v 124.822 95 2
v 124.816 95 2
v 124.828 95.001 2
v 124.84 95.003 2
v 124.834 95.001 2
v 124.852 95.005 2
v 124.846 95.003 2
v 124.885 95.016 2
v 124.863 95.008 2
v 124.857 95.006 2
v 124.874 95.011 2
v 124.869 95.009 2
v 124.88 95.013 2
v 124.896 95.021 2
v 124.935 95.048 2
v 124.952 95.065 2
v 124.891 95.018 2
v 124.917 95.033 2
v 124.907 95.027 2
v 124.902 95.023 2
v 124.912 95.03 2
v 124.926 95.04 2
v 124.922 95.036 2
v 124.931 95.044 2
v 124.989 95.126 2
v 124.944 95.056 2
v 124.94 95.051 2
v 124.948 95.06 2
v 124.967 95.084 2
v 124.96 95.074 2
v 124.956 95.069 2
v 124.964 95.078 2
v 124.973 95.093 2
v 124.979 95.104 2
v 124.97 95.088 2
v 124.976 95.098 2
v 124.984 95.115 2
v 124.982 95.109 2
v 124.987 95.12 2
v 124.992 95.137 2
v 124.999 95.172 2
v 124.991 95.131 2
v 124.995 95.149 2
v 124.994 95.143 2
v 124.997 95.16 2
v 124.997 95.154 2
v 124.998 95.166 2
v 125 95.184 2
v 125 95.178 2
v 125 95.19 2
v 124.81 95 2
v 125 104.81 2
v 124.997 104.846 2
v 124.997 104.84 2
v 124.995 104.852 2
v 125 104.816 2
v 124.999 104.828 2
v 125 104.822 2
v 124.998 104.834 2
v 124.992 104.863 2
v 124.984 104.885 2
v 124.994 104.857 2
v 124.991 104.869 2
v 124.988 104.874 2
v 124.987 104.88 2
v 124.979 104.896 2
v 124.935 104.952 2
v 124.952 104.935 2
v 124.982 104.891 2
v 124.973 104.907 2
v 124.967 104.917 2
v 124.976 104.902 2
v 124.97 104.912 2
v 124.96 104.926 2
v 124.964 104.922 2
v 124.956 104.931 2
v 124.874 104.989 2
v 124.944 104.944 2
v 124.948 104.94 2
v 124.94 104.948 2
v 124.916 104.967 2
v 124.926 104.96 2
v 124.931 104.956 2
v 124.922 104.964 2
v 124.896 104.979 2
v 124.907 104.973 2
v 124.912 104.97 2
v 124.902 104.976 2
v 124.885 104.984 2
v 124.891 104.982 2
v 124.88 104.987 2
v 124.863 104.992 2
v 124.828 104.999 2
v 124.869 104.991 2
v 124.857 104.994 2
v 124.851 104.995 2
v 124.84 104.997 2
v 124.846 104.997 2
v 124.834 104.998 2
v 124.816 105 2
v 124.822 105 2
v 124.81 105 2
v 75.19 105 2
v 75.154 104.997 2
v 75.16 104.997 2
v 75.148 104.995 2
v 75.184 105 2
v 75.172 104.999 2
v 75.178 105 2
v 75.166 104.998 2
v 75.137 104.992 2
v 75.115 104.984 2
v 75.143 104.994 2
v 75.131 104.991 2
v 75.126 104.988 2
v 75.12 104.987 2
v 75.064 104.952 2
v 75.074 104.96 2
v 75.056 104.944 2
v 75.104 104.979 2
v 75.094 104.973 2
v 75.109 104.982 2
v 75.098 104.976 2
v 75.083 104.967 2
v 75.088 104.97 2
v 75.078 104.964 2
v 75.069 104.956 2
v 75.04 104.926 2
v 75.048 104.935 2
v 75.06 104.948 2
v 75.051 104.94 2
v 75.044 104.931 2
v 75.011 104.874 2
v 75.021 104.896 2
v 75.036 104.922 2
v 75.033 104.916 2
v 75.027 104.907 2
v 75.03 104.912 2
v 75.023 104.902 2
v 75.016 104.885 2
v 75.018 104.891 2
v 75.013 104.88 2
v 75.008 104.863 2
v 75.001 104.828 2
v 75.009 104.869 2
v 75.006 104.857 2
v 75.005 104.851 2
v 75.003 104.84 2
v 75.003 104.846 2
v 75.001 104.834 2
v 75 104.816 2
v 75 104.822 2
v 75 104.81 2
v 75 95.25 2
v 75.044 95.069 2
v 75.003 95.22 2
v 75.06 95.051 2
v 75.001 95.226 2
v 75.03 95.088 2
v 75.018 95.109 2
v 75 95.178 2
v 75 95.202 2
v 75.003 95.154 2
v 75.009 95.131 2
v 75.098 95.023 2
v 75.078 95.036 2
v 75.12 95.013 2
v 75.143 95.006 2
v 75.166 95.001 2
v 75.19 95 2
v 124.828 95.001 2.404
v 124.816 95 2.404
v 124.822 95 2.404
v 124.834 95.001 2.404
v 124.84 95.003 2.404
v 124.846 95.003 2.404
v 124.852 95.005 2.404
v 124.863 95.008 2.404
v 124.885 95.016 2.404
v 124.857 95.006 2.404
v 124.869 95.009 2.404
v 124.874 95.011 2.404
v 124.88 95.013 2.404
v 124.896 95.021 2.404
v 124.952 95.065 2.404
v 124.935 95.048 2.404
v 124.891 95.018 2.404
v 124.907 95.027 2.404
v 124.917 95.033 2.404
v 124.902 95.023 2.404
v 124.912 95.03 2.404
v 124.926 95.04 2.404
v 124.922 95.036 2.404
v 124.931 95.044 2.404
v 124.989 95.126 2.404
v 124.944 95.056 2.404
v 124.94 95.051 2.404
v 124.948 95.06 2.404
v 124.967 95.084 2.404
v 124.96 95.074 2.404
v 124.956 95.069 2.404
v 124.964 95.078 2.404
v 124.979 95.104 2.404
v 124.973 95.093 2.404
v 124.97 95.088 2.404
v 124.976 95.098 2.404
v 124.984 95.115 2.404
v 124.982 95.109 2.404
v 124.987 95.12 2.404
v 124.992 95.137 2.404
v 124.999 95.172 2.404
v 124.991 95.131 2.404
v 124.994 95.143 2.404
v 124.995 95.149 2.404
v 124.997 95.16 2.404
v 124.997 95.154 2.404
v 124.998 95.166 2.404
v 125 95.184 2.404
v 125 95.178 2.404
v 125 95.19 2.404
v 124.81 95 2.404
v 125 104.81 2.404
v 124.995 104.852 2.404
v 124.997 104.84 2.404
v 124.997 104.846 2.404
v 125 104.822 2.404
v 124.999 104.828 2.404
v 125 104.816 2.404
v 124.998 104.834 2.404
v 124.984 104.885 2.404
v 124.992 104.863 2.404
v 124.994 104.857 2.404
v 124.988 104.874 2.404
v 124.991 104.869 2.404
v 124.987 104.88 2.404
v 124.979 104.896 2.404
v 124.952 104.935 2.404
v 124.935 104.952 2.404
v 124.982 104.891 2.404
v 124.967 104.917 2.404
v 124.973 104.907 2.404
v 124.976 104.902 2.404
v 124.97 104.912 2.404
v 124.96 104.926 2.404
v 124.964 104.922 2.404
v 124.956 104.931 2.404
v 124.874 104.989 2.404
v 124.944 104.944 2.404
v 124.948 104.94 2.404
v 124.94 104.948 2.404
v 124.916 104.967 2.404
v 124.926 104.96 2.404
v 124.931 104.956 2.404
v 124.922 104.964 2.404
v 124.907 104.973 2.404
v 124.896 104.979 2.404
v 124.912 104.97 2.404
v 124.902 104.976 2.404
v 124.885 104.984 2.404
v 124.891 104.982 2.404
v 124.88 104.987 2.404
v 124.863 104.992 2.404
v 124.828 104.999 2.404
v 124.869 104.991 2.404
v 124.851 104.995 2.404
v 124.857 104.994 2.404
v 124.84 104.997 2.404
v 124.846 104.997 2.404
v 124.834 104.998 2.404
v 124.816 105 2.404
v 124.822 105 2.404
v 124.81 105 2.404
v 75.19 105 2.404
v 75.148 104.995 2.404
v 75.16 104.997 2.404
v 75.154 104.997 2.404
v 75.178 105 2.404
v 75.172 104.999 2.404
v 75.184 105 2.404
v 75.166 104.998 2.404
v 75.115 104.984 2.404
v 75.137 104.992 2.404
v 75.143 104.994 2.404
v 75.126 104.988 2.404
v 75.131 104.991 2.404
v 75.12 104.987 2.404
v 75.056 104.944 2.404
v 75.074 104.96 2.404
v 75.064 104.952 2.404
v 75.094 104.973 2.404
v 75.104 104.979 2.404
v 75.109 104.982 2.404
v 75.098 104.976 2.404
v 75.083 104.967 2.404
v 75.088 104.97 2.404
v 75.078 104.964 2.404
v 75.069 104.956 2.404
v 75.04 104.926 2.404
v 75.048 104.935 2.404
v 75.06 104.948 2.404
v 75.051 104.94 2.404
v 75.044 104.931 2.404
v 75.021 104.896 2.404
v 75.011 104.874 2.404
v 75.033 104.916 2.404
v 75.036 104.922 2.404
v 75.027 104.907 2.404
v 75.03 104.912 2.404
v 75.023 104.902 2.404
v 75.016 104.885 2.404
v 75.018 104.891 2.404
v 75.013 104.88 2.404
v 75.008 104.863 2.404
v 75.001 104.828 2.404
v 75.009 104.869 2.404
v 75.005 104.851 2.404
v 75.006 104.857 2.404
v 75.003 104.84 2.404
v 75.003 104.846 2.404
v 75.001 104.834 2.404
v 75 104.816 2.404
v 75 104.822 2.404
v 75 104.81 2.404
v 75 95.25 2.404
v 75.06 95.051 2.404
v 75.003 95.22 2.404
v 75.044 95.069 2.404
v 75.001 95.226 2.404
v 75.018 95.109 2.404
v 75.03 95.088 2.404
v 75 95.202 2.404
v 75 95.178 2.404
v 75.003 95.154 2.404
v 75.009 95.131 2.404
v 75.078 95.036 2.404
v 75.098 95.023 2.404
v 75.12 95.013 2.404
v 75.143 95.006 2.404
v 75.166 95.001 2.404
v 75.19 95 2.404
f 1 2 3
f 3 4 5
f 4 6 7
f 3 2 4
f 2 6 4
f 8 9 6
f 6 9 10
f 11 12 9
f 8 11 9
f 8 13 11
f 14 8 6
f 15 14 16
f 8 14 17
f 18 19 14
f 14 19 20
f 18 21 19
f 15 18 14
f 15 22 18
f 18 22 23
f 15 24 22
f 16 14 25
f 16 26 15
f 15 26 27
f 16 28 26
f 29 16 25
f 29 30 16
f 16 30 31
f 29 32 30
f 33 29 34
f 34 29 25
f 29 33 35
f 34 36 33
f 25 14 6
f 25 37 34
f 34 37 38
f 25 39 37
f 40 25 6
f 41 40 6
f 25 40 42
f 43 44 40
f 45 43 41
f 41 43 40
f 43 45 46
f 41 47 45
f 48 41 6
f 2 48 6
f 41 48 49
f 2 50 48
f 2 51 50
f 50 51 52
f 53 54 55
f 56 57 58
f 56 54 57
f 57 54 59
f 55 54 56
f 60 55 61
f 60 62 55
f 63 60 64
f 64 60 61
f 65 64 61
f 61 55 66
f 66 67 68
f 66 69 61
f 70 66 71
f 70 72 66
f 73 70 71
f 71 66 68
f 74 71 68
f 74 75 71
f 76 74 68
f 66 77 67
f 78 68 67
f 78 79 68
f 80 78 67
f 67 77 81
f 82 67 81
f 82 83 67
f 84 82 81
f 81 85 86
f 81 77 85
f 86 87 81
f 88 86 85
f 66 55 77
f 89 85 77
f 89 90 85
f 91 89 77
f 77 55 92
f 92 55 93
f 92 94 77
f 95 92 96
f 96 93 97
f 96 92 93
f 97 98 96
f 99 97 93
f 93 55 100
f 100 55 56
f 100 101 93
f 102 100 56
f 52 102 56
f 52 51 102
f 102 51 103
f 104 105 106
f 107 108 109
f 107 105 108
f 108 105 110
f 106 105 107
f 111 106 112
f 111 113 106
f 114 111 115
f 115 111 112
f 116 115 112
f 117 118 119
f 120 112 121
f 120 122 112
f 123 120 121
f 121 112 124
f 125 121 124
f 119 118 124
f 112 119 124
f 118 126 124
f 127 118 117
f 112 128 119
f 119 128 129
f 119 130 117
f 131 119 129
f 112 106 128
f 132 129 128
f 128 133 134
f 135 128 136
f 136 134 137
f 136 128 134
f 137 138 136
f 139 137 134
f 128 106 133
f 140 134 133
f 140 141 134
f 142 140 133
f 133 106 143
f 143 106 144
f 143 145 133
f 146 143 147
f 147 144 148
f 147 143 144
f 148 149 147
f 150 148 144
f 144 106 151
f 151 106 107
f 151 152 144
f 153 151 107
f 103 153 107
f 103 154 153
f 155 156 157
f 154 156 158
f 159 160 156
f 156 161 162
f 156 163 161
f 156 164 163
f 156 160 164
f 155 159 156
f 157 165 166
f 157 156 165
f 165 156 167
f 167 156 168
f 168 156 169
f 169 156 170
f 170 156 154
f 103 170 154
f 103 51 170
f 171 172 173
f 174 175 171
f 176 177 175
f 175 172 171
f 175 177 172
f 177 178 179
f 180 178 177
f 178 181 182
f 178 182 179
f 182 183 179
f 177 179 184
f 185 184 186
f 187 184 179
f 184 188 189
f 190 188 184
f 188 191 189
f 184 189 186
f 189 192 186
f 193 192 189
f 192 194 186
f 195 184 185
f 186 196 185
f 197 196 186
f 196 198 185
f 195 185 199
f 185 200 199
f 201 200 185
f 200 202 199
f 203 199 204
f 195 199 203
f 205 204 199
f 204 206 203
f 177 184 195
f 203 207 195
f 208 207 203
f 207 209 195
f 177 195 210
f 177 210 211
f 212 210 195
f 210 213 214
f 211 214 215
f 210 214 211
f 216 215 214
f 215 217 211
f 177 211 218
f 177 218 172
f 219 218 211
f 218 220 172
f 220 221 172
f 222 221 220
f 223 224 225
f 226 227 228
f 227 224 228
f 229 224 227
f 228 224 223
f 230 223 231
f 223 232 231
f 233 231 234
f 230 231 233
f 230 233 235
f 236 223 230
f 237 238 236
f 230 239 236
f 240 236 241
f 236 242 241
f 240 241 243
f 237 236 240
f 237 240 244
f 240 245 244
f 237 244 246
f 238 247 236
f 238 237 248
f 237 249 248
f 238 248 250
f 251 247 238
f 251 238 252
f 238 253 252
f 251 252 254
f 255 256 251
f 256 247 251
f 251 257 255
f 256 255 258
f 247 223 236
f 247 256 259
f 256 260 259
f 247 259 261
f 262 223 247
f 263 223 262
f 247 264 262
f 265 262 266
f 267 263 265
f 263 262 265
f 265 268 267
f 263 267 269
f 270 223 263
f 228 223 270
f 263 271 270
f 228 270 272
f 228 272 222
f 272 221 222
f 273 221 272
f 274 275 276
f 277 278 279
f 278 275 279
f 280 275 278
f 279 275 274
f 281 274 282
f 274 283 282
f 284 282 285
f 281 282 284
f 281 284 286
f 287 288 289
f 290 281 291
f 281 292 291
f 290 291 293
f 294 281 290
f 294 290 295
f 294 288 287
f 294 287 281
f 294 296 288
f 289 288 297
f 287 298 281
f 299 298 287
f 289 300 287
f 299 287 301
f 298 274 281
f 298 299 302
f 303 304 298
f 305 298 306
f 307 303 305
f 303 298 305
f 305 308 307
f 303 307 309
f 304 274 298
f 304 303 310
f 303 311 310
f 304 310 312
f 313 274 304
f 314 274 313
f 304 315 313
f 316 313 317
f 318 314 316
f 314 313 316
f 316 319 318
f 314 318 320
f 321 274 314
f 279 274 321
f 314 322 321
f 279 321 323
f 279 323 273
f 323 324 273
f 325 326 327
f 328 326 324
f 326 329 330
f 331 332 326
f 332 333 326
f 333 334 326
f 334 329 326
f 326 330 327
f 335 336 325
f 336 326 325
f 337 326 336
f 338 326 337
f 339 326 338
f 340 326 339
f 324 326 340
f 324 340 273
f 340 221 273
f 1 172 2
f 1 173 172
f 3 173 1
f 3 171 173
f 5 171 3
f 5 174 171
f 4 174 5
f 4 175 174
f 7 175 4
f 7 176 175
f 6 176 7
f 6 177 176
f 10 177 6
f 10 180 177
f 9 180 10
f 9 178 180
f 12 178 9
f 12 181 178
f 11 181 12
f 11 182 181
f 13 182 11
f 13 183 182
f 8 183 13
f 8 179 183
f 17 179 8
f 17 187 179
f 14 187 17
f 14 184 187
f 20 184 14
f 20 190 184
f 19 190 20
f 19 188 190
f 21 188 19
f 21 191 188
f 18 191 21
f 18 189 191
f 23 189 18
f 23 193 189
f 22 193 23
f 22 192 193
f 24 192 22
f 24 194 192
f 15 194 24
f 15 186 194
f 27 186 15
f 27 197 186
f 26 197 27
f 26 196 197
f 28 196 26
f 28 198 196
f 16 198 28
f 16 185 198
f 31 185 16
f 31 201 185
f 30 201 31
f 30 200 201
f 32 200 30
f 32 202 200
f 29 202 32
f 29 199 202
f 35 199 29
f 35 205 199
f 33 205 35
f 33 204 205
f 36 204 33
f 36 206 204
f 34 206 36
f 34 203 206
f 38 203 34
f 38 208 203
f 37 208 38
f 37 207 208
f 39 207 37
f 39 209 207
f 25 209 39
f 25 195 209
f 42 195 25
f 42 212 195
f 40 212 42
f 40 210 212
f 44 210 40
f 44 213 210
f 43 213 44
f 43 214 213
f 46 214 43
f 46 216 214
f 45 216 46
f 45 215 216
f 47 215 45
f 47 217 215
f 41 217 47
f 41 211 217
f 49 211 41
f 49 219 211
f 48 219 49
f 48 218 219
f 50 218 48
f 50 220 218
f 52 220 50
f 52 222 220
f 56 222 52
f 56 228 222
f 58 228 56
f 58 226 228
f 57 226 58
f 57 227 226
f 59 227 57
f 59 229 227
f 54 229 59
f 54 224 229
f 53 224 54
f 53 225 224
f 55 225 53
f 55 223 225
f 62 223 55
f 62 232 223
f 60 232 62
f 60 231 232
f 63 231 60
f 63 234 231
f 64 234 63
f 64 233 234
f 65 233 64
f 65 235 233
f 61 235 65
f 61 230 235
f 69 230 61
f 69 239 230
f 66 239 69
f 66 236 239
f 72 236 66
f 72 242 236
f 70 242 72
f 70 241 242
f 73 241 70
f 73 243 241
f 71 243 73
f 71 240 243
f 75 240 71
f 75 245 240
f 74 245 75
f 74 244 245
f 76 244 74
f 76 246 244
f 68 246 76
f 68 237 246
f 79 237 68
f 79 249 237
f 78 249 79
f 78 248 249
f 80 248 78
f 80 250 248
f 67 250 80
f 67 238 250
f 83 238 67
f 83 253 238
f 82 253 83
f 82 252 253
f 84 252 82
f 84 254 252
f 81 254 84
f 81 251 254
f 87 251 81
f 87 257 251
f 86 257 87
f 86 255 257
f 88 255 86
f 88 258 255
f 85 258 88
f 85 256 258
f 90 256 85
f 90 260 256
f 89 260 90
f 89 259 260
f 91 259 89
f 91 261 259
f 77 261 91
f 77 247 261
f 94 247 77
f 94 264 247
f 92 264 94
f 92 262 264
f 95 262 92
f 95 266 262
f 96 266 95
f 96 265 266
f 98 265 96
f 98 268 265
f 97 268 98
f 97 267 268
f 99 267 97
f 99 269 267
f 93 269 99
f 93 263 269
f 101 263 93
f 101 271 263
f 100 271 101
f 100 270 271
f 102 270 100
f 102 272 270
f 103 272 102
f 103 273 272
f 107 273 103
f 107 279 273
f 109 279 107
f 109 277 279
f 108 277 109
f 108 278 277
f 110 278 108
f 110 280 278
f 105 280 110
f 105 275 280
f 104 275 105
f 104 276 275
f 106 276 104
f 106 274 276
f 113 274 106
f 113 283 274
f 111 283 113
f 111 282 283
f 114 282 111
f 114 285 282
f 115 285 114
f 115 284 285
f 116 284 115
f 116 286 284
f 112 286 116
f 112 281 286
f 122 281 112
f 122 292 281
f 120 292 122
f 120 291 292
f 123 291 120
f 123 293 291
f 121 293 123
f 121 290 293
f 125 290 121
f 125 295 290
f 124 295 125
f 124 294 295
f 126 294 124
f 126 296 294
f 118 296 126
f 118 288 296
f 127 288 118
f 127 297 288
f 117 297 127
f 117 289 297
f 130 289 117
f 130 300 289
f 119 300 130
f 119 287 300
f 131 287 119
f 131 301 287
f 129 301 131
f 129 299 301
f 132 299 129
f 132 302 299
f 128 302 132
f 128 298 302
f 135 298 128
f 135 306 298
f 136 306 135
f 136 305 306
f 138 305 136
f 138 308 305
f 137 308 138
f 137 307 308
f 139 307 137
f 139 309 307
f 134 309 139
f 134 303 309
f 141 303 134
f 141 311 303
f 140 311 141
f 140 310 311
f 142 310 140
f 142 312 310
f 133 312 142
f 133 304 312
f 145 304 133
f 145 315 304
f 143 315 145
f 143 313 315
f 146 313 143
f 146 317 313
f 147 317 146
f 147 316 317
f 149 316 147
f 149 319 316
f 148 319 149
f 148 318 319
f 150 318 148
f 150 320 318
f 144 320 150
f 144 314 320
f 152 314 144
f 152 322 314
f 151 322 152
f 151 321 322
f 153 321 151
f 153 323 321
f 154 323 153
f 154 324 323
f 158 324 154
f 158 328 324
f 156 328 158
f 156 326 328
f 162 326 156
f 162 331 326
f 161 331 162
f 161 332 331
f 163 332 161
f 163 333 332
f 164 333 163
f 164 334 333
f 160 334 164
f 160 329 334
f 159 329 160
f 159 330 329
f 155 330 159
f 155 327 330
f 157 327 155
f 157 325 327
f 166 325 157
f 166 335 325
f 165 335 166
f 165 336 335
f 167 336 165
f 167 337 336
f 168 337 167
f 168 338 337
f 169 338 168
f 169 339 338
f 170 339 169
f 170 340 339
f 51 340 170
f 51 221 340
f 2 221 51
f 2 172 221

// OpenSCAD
module drawBasicShape(x1, y1, x2, y2, width)
{
	length = sqrt((x1-x2)*(x1-x2) + (y1-y2)*(y1-y2));
	if (width!=0.0) {
		square(size = [width, length], center = false);
		translate([width/2.0, 0, 0]) circle(d=width);
		translate([width/2.0, length, 0]) circle(d=width);
	}
}

module translateAndRotate(x1, y1, x2, y2, width)
{
	if (width != 0.0) {
		angle = atan((y2-y1)/(x2-x1)) +270;
		if (x2>=x1) {
			translate([x1, y1, 0.0]) rotate([0.0, 0.0, angle]) translate([-width/2.0, 0.0, 0.0]) scale([1.0, 1.0, 1.0]) drawBasicShape(x1, y1, x2, y2, width);
		}
		else {
			translate([x1, y1, 0.0]) rotate([0.0, 0.0, angle+180]) translate([-width/2.0, 0.0, 0.0]) scale([1.0, 1.0, 1.0]) drawBasicShape(x1, y1, x2, y2, width);		}
	}
}

$fn=50;

points4 = [
[75.77800000, 95.77800000, 0.00000000],
[124.22200000, 95.77800000, 0.37999672],
[124.22200000, 104.22200000, 0.37997788],
[75.77800000, 104.22200000, 0.37999548],
[75.77800000, 95.83800000, 0.37998140],
[75.48400000, 95.48400000, 0.00000000],
[124.51600000, 95.48400000, 0.37999746],
[124.51600000, 104.51600000, 0.37998977],
[75.48400000, 104.51600000, 0.37999868],
[75.48400000, 95.54400000, 0.37998644],
[75.19000000, 95.19000000, 0.00000000],
[124.81000000, 95.19000000, 0.38000060],
[124.81000000, 104.81000000, 0.38000021],
[75.19000000, 104.81000000, 0.37999939],
[75.19000000, 95.25000000, 0.38000344],
[75.53600000, 95.39000000, 0.00000000],
[75.94600000, 103.88900000, 0.00000000],
[76.11100000, 104.05400000, 0.37961375],
[76.52800000, 104.05400000, 0.38001190],
[75.94600000, 103.47200000, 0.37989934],
[75.94600000, 103.05500000, 0.38001190],
[76.94500000, 104.05400000, 0.37998907],
[77.36200000, 104.05400000, 0.38001190],
[75.94600000, 102.63800000, 0.37999592],
[75.94600000, 102.22100000, 0.38001190],
[77.77900000, 104.05400000, 0.37999966],
[78.19600000, 104.05400000, 0.38001190],
[75.94600000, 101.80400000, 0.38000201],
[75.94600000, 101.38700000, 0.38015610],
[78.61300000, 104.05400000, 0.38000362],
[79.03000000, 104.05400000, 0.38015610],
[75.94600000, 100.97000000, 0.38001859],
[75.94600000, 100.55300000, 0.38001190],
[79.44700000, 104.05400000, 0.38001785],
[79.86400000, 104.05400000, 0.38015610],
[75.94600000, 100.13600000, 0.38001726],
[75.94600000, 99.71900000, 0.38015610],
[80.28100000, 104.05400000, 0.38002660],
[80.69800000, 104.05400000, 0.38001190],
[75.94600000, 99.30200000, 0.38002534],
[75.94600000, 98.88500000, 0.38001190],
[81.11500000, 104.05400000, 0.38003252],
[81.53300000, 104.05400000, 0.37930814],
[75.94600000, 98.46700000, 0.37997836],
[75.94600000, 98.05000000, 0.38015610],
[81.95000000, 104.05400000, 0.37998072],
[82.36700000, 104.05400000, 0.38001190],
[75.94600000, 97.63300000, 0.37998939],
[75.94600000, 97.21600000, 0.38001190],
[82.78400000, 104.05400000, 0.37999079],
[83.20100000, 104.05400000, 0.38001190],
[75.94600000, 96.79900000, 0.37999789],
[75.94600000, 96.38200000, 0.38001190],
[83.61800000, 104.05400000, 0.37999868],
[84.03500000, 104.05400000, 0.38001190],
[75.95600000, 95.97600000, 0.38000275],
[76.34400000, 95.94600000, 0.37958004],
[84.45200000, 104.05400000, 0.38000229],
[84.86900000, 104.05400000, 0.38001190],
[76.76100000, 95.94600000, 0.38000754],
[77.17800000, 95.94600000, 0.38001190],
[85.28600000, 104.05400000, 0.38000229],
[85.70300000, 104.05400000, 0.38015610],
[77.59500000, 95.94600000, 0.38000229],
[78.01200000, 95.94600000, 0.38001190],
[86.12000000, 104.05400000, 0.38000754],
[86.53700000, 104.05400000, 0.38001190],
[78.42900000, 95.94600000, 0.38000229],
[78.84600000, 95.94600000, 0.38001190],
[86.95400000, 104.05400000, 0.38000754],
[87.37100000, 104.05400000, 0.38001190],
[79.26300000, 95.94600000, 0.38000229],
[79.68000000, 95.94600000, 0.38015610],
[87.78900000, 104.05400000, 0.37998415],
[88.20600000, 104.05400000, 0.38001190],
[80.09700000, 95.94600000, 0.37998940],
[80.51500000, 95.94600000, 0.37930814],
[88.62300000, 104.05400000, 0.38000229],
[89.04000000, 104.05400000, 0.38001190],
[80.93200000, 95.94600000, 0.38000754],
[81.34900000, 95.94600000, 0.38001190],
[89.45700000, 104.05400000, 0.38000229],
[89.87400000, 104.05400000, 0.38015610],
[81.76600000, 95.94600000, 0.38000229],
[82.18300000, 95.94600000, 0.38001190],
[90.29100000, 104.05400000, 0.38000229],
[90.70800000, 104.05400000, 0.38015610],
[82.60000000, 95.94600000, 0.38000229],
[83.01700000, 95.94600000, 0.38001190],
[91.12500000, 104.05400000, 0.38000754],
[91.54200000, 104.05400000, 0.38001190],
[83.43400000, 95.94600000, 0.38000229],
[83.85100000, 95.94600000, 0.38015610],
[91.95900000, 104.05400000, 0.38000229],
[92.37600000, 104.05400000, 0.38001190],
[84.26800000, 95.94600000, 0.38000229],
[84.68500000, 95.94600000, 0.38015610],
[92.79300000, 104.05400000, 0.38000229],
[93.21000000, 104.05400000, 0.38001190],
[85.10200000, 95.94600000, 0.38000754],
[85.51900000, 95.94600000, 0.38001190],
[93.62700000, 104.05400000, 0.38000229],
[94.04400000, 104.05400000, 0.38001190],
[85.93600000, 95.94600000, 0.38000754],
[86.35300000, 95.94600000, 0.38001190],
[94.46200000, 104.05400000, 0.37998415],
[94.87900000, 104.05400000, 0.38015610],
[86.77000000, 95.94600000, 0.37998415],
[87.18800000, 95.94600000, 0.37930814],
[95.29600000, 104.05400000, 0.38000754],
[95.71300000, 104.05400000, 0.38001190],
[87.60500000, 95.94600000, 0.38000229],
[88.02200000, 95.94600000, 0.38001190],
[96.13000000, 104.05400000, 0.38000754],
[96.54700000, 104.05400000, 0.38001190],
[88.43900000, 95.94600000, 0.38000229],
[88.85600000, 95.94600000, 0.38015610],
[96.96400000, 104.05400000, 0.38000229],
[97.38100000, 104.05400000, 0.38001190],
[89.27300000, 95.94600000, 0.38000754],
[89.69000000, 95.94600000, 0.38001190],
[97.79800000, 104.05400000, 0.38000229],
[98.21500000, 104.05400000, 0.38001190],
[90.10700000, 95.94600000, 0.38000754],
[90.52400000, 95.94600000, 0.38001190],
[98.63200000, 104.05400000, 0.38000229],
[99.04900000, 104.05400000, 0.38015610],
[90.94100000, 95.94600000, 0.38000229],
[91.35800000, 95.94600000, 0.38001190],
[99.46600000, 104.05400000, 0.38000754],
[99.88300000, 104.05400000, 0.38001190],
[91.77500000, 95.94600000, 0.38000229],
[92.19200000, 95.94600000, 0.38001190],
[100.30000000, 104.05400000, 0.38000754],
[100.71800000, 104.05400000, 0.37930814],
[92.60900000, 95.94600000, 0.37998415],
[93.02600000, 95.94600000, 0.38015610],
[101.13500000, 104.05400000, 0.37998415],
[101.55200000, 104.05400000, 0.38001190],
[93.44400000, 95.94600000, 0.38000754],
[93.86100000, 95.94600000, 0.38001190],
[101.96900000, 104.05400000, 0.38000229],
[102.38600000, 104.05400000, 0.38001190],
[94.27800000, 95.94600000, 0.38000754],
[94.69500000, 95.94600000, 0.38001190],
[102.80300000, 104.05400000, 0.38000229],
[103.22000000, 104.05400000, 0.38015610],
[95.11200000, 95.94600000, 0.38000229],
[95.52900000, 95.94600000, 0.38001190],
[103.63700000, 104.05400000, 0.38000754],
[104.05400000, 104.05400000, 0.38001190],
[95.94600000, 95.94600000, 0.38000229],
[96.36300000, 95.94600000, 0.38001190],
[104.47100000, 104.05400000, 0.38000754],
[104.88800000, 104.05400000, 0.38001190],
[96.78000000, 95.94600000, 0.38000229],
[97.19700000, 95.94600000, 0.38015610],
[105.30500000, 104.05400000, 0.38000229],
[105.72200000, 104.05400000, 0.38001190],
[97.61400000, 95.94600000, 0.38000229],
[98.03100000, 95.94600000, 0.38015610],
[106.13900000, 104.05400000, 0.38000229],
[106.55600000, 104.05400000, 0.38001190],
[98.44800000, 95.94600000, 0.38000754],
[98.86500000, 95.94600000, 0.38001190],
[106.97300000, 104.05400000, 0.38000229],
[107.39100000, 104.05400000, 0.37945200],
[99.28200000, 95.94600000, 0.37998415],
[99.69900000, 95.94600000, 0.38001190],
[107.80800000, 104.05400000, 0.37998415],
[108.22500000, 104.05400000, 0.38015610],
[100.11700000, 95.94600000, 0.38000229],
[100.53400000, 95.94600000, 0.38001190],
[108.64200000, 104.05400000, 0.38000754],
[109.05900000, 104.05400000, 0.38001190],
[100.95100000, 95.94600000, 0.38000229],
[101.36800000, 95.94600000, 0.38001190],
[109.47600000, 104.05400000, 0.38000754],
[109.89300000, 104.05400000, 0.38001190],
[101.78500000, 95.94600000, 0.38000229],
[102.20200000, 95.94600000, 0.38015610],
[110.31000000, 104.05400000, 0.38000229],
[110.72700000, 104.05400000, 0.38001190],
[102.61900000, 95.94600000, 0.38000754],
[103.03600000, 95.94600000, 0.38001190],
[111.14400000, 104.05400000, 0.38000229],
[111.56100000, 104.05400000, 0.38001190],
[103.45300000, 95.94600000, 0.38000754],
[103.87000000, 95.94600000, 0.38001190],
[111.97800000, 104.05400000, 0.38000229],
[112.39500000, 104.05400000, 0.38015610],
[104.28700000, 95.94600000, 0.38000229],
[104.70400000, 95.94600000, 0.38001190],
[112.81200000, 104.05400000, 0.38000754],
[113.22900000, 104.05400000, 0.38001190],
[105.12100000, 95.94600000, 0.38000229],
[105.53800000, 95.94600000, 0.38001190],
[113.64700000, 104.05400000, 0.37998940],
[114.06400000, 104.05400000, 0.38001190],
[105.95500000, 95.94600000, 0.37998415],
[106.37300000, 95.94600000, 0.37945200],
[114.48100000, 104.05400000, 0.38000229],
[114.89800000, 104.05400000, 0.38001190],
[106.79000000, 95.94600000, 0.38000754],
[107.20700000, 95.94600000, 0.38001190],
[115.31500000, 104.05400000, 0.38000229],
[115.73200000, 104.05400000, 0.38001190],
[107.62400000, 95.94600000, 0.38000754],
[108.04100000, 95.94600000, 0.38001190],
[116.14900000, 104.05400000, 0.38000229],
[116.56600000, 104.05400000, 0.38015610],
[108.45800000, 95.94600000, 0.38000229],
[108.87500000, 95.94600000, 0.38001190],
[116.98300000, 104.05400000, 0.38000754],
[117.40000000, 104.05400000, 0.38001190],
[109.29200000, 95.94600000, 0.38000229],
[109.70900000, 95.94600000, 0.38001190],
[117.81700000, 104.05400000, 0.38000754],
[118.23400000, 104.05400000, 0.38001190],
[110.12600000, 95.94600000, 0.38000229],
[110.54300000, 95.94600000, 0.38015610],
[118.65100000, 104.05400000, 0.38000229],
[119.06800000, 104.05400000, 0.38001190],
[110.96000000, 95.94600000, 0.38000229],
[111.37700000, 95.94600000, 0.38015610],
[119.48500000, 104.05400000, 0.38000229],
[119.90200000, 104.05400000, 0.38001190],
[111.79400000, 95.94600000, 0.38000754],
[112.21100000, 95.94600000, 0.38001190],
[120.32000000, 104.05400000, 0.37998415],
[120.73700000, 104.05400000, 0.38001190],
[112.62900000, 95.94600000, 0.38000754],
[113.04600000, 95.94600000, 0.38001190],
[121.15400000, 104.05400000, 0.38000229],
[121.57100000, 104.05400000, 0.38015610],
[113.46300000, 95.94600000, 0.38000229],
[113.88000000, 95.94600000, 0.38001190],
[121.98800000, 104.05400000, 0.38000754],
[122.40500000, 104.05400000, 0.38001190],
[114.29700000, 95.94600000, 0.38000229],
[114.71400000, 95.94600000, 0.38001190],
[122.82200000, 104.05400000, 0.38000754],
[123.23900000, 104.05400000, 0.38001190],
[115.13100000, 95.94600000, 0.38000229],
[115.54800000, 95.94600000, 0.38015610],
[123.65600000, 104.05400000, 0.38000229],
[124.04400000, 104.02500000, 0.37963728],
[115.96500000, 95.94600000, 0.37998455],
[116.38200000, 95.94600000, 0.38001190],
[124.05400000, 103.61800000, 0.37999868],
[124.05400000, 103.20100000, 0.38015610],
[116.79900000, 95.94600000, 0.37999203],
[117.21600000, 95.94600000, 0.38015610],
[124.05400000, 102.78400000, 0.37999079],
[124.05400000, 102.36700000, 0.38001190],
[117.63300000, 95.94600000, 0.37998939],
[118.05000000, 95.94600000, 0.38001190],
[124.05400000, 101.95000000, 0.37998780],
[124.05400000, 101.53300000, 0.38001190],
[118.46700000, 95.94600000, 0.37998597],
[118.88400000, 95.94600000, 0.38001190],
[124.05400000, 101.11600000, 0.37997562],
[124.05400000, 100.69800000, 0.37930814],
[119.30200000, 95.94600000, 0.38003429],
[119.71900000, 95.94600000, 0.38001190],
[124.05400000, 100.28100000, 0.38003640],
[124.05400000, 99.86400000, 0.38001190],
[120.13600000, 95.94600000, 0.38002811],
[120.55300000, 95.94600000, 0.38001190],
[124.05400000, 99.44700000, 0.38002999],
[124.05400000, 99.03000000, 0.38001190],
[120.97000000, 95.94600000, 0.38003238],
[121.38700000, 95.94600000, 0.38001190],
[124.05400000, 98.61300000, 0.38001957],
[124.05400000, 98.19600000, 0.38001190],
[121.80400000, 95.94600000, 0.38002091],
[122.22100000, 95.94600000, 0.38001190],
[124.05400000, 97.77900000, 0.38002285],
[124.05400000, 97.36200000, 0.38001190],
[122.63800000, 95.94600000, 0.37999592],
[123.05500000, 95.94600000, 0.38001190],
[124.05400000, 96.94500000, 0.37998907],
[124.05400000, 96.52800000, 0.38001190],
[123.47200000, 95.94600000, 0.37997240],
[123.88900000, 95.94600000, 0.38001190],
[124.05400000, 96.11100000, 0.37961375],
];

translate([0.0, 0.0, 2.00000000]) {
	linear_extrude(height = 0.40400000, center = false, convexity = 10, twist = 0) {
		union() {
			for( i=[0:len(points4)-2] ){ 
				x1 = points4[i][0];
				y1 = points4[i][1];
				x2 = points4[i+1][0];
				y2 = points4[i+1][1];
				width = points4[i+1][2];
				translateAndRotate(x1, y1, x2, y2, width);
			}
		}
	}
}
